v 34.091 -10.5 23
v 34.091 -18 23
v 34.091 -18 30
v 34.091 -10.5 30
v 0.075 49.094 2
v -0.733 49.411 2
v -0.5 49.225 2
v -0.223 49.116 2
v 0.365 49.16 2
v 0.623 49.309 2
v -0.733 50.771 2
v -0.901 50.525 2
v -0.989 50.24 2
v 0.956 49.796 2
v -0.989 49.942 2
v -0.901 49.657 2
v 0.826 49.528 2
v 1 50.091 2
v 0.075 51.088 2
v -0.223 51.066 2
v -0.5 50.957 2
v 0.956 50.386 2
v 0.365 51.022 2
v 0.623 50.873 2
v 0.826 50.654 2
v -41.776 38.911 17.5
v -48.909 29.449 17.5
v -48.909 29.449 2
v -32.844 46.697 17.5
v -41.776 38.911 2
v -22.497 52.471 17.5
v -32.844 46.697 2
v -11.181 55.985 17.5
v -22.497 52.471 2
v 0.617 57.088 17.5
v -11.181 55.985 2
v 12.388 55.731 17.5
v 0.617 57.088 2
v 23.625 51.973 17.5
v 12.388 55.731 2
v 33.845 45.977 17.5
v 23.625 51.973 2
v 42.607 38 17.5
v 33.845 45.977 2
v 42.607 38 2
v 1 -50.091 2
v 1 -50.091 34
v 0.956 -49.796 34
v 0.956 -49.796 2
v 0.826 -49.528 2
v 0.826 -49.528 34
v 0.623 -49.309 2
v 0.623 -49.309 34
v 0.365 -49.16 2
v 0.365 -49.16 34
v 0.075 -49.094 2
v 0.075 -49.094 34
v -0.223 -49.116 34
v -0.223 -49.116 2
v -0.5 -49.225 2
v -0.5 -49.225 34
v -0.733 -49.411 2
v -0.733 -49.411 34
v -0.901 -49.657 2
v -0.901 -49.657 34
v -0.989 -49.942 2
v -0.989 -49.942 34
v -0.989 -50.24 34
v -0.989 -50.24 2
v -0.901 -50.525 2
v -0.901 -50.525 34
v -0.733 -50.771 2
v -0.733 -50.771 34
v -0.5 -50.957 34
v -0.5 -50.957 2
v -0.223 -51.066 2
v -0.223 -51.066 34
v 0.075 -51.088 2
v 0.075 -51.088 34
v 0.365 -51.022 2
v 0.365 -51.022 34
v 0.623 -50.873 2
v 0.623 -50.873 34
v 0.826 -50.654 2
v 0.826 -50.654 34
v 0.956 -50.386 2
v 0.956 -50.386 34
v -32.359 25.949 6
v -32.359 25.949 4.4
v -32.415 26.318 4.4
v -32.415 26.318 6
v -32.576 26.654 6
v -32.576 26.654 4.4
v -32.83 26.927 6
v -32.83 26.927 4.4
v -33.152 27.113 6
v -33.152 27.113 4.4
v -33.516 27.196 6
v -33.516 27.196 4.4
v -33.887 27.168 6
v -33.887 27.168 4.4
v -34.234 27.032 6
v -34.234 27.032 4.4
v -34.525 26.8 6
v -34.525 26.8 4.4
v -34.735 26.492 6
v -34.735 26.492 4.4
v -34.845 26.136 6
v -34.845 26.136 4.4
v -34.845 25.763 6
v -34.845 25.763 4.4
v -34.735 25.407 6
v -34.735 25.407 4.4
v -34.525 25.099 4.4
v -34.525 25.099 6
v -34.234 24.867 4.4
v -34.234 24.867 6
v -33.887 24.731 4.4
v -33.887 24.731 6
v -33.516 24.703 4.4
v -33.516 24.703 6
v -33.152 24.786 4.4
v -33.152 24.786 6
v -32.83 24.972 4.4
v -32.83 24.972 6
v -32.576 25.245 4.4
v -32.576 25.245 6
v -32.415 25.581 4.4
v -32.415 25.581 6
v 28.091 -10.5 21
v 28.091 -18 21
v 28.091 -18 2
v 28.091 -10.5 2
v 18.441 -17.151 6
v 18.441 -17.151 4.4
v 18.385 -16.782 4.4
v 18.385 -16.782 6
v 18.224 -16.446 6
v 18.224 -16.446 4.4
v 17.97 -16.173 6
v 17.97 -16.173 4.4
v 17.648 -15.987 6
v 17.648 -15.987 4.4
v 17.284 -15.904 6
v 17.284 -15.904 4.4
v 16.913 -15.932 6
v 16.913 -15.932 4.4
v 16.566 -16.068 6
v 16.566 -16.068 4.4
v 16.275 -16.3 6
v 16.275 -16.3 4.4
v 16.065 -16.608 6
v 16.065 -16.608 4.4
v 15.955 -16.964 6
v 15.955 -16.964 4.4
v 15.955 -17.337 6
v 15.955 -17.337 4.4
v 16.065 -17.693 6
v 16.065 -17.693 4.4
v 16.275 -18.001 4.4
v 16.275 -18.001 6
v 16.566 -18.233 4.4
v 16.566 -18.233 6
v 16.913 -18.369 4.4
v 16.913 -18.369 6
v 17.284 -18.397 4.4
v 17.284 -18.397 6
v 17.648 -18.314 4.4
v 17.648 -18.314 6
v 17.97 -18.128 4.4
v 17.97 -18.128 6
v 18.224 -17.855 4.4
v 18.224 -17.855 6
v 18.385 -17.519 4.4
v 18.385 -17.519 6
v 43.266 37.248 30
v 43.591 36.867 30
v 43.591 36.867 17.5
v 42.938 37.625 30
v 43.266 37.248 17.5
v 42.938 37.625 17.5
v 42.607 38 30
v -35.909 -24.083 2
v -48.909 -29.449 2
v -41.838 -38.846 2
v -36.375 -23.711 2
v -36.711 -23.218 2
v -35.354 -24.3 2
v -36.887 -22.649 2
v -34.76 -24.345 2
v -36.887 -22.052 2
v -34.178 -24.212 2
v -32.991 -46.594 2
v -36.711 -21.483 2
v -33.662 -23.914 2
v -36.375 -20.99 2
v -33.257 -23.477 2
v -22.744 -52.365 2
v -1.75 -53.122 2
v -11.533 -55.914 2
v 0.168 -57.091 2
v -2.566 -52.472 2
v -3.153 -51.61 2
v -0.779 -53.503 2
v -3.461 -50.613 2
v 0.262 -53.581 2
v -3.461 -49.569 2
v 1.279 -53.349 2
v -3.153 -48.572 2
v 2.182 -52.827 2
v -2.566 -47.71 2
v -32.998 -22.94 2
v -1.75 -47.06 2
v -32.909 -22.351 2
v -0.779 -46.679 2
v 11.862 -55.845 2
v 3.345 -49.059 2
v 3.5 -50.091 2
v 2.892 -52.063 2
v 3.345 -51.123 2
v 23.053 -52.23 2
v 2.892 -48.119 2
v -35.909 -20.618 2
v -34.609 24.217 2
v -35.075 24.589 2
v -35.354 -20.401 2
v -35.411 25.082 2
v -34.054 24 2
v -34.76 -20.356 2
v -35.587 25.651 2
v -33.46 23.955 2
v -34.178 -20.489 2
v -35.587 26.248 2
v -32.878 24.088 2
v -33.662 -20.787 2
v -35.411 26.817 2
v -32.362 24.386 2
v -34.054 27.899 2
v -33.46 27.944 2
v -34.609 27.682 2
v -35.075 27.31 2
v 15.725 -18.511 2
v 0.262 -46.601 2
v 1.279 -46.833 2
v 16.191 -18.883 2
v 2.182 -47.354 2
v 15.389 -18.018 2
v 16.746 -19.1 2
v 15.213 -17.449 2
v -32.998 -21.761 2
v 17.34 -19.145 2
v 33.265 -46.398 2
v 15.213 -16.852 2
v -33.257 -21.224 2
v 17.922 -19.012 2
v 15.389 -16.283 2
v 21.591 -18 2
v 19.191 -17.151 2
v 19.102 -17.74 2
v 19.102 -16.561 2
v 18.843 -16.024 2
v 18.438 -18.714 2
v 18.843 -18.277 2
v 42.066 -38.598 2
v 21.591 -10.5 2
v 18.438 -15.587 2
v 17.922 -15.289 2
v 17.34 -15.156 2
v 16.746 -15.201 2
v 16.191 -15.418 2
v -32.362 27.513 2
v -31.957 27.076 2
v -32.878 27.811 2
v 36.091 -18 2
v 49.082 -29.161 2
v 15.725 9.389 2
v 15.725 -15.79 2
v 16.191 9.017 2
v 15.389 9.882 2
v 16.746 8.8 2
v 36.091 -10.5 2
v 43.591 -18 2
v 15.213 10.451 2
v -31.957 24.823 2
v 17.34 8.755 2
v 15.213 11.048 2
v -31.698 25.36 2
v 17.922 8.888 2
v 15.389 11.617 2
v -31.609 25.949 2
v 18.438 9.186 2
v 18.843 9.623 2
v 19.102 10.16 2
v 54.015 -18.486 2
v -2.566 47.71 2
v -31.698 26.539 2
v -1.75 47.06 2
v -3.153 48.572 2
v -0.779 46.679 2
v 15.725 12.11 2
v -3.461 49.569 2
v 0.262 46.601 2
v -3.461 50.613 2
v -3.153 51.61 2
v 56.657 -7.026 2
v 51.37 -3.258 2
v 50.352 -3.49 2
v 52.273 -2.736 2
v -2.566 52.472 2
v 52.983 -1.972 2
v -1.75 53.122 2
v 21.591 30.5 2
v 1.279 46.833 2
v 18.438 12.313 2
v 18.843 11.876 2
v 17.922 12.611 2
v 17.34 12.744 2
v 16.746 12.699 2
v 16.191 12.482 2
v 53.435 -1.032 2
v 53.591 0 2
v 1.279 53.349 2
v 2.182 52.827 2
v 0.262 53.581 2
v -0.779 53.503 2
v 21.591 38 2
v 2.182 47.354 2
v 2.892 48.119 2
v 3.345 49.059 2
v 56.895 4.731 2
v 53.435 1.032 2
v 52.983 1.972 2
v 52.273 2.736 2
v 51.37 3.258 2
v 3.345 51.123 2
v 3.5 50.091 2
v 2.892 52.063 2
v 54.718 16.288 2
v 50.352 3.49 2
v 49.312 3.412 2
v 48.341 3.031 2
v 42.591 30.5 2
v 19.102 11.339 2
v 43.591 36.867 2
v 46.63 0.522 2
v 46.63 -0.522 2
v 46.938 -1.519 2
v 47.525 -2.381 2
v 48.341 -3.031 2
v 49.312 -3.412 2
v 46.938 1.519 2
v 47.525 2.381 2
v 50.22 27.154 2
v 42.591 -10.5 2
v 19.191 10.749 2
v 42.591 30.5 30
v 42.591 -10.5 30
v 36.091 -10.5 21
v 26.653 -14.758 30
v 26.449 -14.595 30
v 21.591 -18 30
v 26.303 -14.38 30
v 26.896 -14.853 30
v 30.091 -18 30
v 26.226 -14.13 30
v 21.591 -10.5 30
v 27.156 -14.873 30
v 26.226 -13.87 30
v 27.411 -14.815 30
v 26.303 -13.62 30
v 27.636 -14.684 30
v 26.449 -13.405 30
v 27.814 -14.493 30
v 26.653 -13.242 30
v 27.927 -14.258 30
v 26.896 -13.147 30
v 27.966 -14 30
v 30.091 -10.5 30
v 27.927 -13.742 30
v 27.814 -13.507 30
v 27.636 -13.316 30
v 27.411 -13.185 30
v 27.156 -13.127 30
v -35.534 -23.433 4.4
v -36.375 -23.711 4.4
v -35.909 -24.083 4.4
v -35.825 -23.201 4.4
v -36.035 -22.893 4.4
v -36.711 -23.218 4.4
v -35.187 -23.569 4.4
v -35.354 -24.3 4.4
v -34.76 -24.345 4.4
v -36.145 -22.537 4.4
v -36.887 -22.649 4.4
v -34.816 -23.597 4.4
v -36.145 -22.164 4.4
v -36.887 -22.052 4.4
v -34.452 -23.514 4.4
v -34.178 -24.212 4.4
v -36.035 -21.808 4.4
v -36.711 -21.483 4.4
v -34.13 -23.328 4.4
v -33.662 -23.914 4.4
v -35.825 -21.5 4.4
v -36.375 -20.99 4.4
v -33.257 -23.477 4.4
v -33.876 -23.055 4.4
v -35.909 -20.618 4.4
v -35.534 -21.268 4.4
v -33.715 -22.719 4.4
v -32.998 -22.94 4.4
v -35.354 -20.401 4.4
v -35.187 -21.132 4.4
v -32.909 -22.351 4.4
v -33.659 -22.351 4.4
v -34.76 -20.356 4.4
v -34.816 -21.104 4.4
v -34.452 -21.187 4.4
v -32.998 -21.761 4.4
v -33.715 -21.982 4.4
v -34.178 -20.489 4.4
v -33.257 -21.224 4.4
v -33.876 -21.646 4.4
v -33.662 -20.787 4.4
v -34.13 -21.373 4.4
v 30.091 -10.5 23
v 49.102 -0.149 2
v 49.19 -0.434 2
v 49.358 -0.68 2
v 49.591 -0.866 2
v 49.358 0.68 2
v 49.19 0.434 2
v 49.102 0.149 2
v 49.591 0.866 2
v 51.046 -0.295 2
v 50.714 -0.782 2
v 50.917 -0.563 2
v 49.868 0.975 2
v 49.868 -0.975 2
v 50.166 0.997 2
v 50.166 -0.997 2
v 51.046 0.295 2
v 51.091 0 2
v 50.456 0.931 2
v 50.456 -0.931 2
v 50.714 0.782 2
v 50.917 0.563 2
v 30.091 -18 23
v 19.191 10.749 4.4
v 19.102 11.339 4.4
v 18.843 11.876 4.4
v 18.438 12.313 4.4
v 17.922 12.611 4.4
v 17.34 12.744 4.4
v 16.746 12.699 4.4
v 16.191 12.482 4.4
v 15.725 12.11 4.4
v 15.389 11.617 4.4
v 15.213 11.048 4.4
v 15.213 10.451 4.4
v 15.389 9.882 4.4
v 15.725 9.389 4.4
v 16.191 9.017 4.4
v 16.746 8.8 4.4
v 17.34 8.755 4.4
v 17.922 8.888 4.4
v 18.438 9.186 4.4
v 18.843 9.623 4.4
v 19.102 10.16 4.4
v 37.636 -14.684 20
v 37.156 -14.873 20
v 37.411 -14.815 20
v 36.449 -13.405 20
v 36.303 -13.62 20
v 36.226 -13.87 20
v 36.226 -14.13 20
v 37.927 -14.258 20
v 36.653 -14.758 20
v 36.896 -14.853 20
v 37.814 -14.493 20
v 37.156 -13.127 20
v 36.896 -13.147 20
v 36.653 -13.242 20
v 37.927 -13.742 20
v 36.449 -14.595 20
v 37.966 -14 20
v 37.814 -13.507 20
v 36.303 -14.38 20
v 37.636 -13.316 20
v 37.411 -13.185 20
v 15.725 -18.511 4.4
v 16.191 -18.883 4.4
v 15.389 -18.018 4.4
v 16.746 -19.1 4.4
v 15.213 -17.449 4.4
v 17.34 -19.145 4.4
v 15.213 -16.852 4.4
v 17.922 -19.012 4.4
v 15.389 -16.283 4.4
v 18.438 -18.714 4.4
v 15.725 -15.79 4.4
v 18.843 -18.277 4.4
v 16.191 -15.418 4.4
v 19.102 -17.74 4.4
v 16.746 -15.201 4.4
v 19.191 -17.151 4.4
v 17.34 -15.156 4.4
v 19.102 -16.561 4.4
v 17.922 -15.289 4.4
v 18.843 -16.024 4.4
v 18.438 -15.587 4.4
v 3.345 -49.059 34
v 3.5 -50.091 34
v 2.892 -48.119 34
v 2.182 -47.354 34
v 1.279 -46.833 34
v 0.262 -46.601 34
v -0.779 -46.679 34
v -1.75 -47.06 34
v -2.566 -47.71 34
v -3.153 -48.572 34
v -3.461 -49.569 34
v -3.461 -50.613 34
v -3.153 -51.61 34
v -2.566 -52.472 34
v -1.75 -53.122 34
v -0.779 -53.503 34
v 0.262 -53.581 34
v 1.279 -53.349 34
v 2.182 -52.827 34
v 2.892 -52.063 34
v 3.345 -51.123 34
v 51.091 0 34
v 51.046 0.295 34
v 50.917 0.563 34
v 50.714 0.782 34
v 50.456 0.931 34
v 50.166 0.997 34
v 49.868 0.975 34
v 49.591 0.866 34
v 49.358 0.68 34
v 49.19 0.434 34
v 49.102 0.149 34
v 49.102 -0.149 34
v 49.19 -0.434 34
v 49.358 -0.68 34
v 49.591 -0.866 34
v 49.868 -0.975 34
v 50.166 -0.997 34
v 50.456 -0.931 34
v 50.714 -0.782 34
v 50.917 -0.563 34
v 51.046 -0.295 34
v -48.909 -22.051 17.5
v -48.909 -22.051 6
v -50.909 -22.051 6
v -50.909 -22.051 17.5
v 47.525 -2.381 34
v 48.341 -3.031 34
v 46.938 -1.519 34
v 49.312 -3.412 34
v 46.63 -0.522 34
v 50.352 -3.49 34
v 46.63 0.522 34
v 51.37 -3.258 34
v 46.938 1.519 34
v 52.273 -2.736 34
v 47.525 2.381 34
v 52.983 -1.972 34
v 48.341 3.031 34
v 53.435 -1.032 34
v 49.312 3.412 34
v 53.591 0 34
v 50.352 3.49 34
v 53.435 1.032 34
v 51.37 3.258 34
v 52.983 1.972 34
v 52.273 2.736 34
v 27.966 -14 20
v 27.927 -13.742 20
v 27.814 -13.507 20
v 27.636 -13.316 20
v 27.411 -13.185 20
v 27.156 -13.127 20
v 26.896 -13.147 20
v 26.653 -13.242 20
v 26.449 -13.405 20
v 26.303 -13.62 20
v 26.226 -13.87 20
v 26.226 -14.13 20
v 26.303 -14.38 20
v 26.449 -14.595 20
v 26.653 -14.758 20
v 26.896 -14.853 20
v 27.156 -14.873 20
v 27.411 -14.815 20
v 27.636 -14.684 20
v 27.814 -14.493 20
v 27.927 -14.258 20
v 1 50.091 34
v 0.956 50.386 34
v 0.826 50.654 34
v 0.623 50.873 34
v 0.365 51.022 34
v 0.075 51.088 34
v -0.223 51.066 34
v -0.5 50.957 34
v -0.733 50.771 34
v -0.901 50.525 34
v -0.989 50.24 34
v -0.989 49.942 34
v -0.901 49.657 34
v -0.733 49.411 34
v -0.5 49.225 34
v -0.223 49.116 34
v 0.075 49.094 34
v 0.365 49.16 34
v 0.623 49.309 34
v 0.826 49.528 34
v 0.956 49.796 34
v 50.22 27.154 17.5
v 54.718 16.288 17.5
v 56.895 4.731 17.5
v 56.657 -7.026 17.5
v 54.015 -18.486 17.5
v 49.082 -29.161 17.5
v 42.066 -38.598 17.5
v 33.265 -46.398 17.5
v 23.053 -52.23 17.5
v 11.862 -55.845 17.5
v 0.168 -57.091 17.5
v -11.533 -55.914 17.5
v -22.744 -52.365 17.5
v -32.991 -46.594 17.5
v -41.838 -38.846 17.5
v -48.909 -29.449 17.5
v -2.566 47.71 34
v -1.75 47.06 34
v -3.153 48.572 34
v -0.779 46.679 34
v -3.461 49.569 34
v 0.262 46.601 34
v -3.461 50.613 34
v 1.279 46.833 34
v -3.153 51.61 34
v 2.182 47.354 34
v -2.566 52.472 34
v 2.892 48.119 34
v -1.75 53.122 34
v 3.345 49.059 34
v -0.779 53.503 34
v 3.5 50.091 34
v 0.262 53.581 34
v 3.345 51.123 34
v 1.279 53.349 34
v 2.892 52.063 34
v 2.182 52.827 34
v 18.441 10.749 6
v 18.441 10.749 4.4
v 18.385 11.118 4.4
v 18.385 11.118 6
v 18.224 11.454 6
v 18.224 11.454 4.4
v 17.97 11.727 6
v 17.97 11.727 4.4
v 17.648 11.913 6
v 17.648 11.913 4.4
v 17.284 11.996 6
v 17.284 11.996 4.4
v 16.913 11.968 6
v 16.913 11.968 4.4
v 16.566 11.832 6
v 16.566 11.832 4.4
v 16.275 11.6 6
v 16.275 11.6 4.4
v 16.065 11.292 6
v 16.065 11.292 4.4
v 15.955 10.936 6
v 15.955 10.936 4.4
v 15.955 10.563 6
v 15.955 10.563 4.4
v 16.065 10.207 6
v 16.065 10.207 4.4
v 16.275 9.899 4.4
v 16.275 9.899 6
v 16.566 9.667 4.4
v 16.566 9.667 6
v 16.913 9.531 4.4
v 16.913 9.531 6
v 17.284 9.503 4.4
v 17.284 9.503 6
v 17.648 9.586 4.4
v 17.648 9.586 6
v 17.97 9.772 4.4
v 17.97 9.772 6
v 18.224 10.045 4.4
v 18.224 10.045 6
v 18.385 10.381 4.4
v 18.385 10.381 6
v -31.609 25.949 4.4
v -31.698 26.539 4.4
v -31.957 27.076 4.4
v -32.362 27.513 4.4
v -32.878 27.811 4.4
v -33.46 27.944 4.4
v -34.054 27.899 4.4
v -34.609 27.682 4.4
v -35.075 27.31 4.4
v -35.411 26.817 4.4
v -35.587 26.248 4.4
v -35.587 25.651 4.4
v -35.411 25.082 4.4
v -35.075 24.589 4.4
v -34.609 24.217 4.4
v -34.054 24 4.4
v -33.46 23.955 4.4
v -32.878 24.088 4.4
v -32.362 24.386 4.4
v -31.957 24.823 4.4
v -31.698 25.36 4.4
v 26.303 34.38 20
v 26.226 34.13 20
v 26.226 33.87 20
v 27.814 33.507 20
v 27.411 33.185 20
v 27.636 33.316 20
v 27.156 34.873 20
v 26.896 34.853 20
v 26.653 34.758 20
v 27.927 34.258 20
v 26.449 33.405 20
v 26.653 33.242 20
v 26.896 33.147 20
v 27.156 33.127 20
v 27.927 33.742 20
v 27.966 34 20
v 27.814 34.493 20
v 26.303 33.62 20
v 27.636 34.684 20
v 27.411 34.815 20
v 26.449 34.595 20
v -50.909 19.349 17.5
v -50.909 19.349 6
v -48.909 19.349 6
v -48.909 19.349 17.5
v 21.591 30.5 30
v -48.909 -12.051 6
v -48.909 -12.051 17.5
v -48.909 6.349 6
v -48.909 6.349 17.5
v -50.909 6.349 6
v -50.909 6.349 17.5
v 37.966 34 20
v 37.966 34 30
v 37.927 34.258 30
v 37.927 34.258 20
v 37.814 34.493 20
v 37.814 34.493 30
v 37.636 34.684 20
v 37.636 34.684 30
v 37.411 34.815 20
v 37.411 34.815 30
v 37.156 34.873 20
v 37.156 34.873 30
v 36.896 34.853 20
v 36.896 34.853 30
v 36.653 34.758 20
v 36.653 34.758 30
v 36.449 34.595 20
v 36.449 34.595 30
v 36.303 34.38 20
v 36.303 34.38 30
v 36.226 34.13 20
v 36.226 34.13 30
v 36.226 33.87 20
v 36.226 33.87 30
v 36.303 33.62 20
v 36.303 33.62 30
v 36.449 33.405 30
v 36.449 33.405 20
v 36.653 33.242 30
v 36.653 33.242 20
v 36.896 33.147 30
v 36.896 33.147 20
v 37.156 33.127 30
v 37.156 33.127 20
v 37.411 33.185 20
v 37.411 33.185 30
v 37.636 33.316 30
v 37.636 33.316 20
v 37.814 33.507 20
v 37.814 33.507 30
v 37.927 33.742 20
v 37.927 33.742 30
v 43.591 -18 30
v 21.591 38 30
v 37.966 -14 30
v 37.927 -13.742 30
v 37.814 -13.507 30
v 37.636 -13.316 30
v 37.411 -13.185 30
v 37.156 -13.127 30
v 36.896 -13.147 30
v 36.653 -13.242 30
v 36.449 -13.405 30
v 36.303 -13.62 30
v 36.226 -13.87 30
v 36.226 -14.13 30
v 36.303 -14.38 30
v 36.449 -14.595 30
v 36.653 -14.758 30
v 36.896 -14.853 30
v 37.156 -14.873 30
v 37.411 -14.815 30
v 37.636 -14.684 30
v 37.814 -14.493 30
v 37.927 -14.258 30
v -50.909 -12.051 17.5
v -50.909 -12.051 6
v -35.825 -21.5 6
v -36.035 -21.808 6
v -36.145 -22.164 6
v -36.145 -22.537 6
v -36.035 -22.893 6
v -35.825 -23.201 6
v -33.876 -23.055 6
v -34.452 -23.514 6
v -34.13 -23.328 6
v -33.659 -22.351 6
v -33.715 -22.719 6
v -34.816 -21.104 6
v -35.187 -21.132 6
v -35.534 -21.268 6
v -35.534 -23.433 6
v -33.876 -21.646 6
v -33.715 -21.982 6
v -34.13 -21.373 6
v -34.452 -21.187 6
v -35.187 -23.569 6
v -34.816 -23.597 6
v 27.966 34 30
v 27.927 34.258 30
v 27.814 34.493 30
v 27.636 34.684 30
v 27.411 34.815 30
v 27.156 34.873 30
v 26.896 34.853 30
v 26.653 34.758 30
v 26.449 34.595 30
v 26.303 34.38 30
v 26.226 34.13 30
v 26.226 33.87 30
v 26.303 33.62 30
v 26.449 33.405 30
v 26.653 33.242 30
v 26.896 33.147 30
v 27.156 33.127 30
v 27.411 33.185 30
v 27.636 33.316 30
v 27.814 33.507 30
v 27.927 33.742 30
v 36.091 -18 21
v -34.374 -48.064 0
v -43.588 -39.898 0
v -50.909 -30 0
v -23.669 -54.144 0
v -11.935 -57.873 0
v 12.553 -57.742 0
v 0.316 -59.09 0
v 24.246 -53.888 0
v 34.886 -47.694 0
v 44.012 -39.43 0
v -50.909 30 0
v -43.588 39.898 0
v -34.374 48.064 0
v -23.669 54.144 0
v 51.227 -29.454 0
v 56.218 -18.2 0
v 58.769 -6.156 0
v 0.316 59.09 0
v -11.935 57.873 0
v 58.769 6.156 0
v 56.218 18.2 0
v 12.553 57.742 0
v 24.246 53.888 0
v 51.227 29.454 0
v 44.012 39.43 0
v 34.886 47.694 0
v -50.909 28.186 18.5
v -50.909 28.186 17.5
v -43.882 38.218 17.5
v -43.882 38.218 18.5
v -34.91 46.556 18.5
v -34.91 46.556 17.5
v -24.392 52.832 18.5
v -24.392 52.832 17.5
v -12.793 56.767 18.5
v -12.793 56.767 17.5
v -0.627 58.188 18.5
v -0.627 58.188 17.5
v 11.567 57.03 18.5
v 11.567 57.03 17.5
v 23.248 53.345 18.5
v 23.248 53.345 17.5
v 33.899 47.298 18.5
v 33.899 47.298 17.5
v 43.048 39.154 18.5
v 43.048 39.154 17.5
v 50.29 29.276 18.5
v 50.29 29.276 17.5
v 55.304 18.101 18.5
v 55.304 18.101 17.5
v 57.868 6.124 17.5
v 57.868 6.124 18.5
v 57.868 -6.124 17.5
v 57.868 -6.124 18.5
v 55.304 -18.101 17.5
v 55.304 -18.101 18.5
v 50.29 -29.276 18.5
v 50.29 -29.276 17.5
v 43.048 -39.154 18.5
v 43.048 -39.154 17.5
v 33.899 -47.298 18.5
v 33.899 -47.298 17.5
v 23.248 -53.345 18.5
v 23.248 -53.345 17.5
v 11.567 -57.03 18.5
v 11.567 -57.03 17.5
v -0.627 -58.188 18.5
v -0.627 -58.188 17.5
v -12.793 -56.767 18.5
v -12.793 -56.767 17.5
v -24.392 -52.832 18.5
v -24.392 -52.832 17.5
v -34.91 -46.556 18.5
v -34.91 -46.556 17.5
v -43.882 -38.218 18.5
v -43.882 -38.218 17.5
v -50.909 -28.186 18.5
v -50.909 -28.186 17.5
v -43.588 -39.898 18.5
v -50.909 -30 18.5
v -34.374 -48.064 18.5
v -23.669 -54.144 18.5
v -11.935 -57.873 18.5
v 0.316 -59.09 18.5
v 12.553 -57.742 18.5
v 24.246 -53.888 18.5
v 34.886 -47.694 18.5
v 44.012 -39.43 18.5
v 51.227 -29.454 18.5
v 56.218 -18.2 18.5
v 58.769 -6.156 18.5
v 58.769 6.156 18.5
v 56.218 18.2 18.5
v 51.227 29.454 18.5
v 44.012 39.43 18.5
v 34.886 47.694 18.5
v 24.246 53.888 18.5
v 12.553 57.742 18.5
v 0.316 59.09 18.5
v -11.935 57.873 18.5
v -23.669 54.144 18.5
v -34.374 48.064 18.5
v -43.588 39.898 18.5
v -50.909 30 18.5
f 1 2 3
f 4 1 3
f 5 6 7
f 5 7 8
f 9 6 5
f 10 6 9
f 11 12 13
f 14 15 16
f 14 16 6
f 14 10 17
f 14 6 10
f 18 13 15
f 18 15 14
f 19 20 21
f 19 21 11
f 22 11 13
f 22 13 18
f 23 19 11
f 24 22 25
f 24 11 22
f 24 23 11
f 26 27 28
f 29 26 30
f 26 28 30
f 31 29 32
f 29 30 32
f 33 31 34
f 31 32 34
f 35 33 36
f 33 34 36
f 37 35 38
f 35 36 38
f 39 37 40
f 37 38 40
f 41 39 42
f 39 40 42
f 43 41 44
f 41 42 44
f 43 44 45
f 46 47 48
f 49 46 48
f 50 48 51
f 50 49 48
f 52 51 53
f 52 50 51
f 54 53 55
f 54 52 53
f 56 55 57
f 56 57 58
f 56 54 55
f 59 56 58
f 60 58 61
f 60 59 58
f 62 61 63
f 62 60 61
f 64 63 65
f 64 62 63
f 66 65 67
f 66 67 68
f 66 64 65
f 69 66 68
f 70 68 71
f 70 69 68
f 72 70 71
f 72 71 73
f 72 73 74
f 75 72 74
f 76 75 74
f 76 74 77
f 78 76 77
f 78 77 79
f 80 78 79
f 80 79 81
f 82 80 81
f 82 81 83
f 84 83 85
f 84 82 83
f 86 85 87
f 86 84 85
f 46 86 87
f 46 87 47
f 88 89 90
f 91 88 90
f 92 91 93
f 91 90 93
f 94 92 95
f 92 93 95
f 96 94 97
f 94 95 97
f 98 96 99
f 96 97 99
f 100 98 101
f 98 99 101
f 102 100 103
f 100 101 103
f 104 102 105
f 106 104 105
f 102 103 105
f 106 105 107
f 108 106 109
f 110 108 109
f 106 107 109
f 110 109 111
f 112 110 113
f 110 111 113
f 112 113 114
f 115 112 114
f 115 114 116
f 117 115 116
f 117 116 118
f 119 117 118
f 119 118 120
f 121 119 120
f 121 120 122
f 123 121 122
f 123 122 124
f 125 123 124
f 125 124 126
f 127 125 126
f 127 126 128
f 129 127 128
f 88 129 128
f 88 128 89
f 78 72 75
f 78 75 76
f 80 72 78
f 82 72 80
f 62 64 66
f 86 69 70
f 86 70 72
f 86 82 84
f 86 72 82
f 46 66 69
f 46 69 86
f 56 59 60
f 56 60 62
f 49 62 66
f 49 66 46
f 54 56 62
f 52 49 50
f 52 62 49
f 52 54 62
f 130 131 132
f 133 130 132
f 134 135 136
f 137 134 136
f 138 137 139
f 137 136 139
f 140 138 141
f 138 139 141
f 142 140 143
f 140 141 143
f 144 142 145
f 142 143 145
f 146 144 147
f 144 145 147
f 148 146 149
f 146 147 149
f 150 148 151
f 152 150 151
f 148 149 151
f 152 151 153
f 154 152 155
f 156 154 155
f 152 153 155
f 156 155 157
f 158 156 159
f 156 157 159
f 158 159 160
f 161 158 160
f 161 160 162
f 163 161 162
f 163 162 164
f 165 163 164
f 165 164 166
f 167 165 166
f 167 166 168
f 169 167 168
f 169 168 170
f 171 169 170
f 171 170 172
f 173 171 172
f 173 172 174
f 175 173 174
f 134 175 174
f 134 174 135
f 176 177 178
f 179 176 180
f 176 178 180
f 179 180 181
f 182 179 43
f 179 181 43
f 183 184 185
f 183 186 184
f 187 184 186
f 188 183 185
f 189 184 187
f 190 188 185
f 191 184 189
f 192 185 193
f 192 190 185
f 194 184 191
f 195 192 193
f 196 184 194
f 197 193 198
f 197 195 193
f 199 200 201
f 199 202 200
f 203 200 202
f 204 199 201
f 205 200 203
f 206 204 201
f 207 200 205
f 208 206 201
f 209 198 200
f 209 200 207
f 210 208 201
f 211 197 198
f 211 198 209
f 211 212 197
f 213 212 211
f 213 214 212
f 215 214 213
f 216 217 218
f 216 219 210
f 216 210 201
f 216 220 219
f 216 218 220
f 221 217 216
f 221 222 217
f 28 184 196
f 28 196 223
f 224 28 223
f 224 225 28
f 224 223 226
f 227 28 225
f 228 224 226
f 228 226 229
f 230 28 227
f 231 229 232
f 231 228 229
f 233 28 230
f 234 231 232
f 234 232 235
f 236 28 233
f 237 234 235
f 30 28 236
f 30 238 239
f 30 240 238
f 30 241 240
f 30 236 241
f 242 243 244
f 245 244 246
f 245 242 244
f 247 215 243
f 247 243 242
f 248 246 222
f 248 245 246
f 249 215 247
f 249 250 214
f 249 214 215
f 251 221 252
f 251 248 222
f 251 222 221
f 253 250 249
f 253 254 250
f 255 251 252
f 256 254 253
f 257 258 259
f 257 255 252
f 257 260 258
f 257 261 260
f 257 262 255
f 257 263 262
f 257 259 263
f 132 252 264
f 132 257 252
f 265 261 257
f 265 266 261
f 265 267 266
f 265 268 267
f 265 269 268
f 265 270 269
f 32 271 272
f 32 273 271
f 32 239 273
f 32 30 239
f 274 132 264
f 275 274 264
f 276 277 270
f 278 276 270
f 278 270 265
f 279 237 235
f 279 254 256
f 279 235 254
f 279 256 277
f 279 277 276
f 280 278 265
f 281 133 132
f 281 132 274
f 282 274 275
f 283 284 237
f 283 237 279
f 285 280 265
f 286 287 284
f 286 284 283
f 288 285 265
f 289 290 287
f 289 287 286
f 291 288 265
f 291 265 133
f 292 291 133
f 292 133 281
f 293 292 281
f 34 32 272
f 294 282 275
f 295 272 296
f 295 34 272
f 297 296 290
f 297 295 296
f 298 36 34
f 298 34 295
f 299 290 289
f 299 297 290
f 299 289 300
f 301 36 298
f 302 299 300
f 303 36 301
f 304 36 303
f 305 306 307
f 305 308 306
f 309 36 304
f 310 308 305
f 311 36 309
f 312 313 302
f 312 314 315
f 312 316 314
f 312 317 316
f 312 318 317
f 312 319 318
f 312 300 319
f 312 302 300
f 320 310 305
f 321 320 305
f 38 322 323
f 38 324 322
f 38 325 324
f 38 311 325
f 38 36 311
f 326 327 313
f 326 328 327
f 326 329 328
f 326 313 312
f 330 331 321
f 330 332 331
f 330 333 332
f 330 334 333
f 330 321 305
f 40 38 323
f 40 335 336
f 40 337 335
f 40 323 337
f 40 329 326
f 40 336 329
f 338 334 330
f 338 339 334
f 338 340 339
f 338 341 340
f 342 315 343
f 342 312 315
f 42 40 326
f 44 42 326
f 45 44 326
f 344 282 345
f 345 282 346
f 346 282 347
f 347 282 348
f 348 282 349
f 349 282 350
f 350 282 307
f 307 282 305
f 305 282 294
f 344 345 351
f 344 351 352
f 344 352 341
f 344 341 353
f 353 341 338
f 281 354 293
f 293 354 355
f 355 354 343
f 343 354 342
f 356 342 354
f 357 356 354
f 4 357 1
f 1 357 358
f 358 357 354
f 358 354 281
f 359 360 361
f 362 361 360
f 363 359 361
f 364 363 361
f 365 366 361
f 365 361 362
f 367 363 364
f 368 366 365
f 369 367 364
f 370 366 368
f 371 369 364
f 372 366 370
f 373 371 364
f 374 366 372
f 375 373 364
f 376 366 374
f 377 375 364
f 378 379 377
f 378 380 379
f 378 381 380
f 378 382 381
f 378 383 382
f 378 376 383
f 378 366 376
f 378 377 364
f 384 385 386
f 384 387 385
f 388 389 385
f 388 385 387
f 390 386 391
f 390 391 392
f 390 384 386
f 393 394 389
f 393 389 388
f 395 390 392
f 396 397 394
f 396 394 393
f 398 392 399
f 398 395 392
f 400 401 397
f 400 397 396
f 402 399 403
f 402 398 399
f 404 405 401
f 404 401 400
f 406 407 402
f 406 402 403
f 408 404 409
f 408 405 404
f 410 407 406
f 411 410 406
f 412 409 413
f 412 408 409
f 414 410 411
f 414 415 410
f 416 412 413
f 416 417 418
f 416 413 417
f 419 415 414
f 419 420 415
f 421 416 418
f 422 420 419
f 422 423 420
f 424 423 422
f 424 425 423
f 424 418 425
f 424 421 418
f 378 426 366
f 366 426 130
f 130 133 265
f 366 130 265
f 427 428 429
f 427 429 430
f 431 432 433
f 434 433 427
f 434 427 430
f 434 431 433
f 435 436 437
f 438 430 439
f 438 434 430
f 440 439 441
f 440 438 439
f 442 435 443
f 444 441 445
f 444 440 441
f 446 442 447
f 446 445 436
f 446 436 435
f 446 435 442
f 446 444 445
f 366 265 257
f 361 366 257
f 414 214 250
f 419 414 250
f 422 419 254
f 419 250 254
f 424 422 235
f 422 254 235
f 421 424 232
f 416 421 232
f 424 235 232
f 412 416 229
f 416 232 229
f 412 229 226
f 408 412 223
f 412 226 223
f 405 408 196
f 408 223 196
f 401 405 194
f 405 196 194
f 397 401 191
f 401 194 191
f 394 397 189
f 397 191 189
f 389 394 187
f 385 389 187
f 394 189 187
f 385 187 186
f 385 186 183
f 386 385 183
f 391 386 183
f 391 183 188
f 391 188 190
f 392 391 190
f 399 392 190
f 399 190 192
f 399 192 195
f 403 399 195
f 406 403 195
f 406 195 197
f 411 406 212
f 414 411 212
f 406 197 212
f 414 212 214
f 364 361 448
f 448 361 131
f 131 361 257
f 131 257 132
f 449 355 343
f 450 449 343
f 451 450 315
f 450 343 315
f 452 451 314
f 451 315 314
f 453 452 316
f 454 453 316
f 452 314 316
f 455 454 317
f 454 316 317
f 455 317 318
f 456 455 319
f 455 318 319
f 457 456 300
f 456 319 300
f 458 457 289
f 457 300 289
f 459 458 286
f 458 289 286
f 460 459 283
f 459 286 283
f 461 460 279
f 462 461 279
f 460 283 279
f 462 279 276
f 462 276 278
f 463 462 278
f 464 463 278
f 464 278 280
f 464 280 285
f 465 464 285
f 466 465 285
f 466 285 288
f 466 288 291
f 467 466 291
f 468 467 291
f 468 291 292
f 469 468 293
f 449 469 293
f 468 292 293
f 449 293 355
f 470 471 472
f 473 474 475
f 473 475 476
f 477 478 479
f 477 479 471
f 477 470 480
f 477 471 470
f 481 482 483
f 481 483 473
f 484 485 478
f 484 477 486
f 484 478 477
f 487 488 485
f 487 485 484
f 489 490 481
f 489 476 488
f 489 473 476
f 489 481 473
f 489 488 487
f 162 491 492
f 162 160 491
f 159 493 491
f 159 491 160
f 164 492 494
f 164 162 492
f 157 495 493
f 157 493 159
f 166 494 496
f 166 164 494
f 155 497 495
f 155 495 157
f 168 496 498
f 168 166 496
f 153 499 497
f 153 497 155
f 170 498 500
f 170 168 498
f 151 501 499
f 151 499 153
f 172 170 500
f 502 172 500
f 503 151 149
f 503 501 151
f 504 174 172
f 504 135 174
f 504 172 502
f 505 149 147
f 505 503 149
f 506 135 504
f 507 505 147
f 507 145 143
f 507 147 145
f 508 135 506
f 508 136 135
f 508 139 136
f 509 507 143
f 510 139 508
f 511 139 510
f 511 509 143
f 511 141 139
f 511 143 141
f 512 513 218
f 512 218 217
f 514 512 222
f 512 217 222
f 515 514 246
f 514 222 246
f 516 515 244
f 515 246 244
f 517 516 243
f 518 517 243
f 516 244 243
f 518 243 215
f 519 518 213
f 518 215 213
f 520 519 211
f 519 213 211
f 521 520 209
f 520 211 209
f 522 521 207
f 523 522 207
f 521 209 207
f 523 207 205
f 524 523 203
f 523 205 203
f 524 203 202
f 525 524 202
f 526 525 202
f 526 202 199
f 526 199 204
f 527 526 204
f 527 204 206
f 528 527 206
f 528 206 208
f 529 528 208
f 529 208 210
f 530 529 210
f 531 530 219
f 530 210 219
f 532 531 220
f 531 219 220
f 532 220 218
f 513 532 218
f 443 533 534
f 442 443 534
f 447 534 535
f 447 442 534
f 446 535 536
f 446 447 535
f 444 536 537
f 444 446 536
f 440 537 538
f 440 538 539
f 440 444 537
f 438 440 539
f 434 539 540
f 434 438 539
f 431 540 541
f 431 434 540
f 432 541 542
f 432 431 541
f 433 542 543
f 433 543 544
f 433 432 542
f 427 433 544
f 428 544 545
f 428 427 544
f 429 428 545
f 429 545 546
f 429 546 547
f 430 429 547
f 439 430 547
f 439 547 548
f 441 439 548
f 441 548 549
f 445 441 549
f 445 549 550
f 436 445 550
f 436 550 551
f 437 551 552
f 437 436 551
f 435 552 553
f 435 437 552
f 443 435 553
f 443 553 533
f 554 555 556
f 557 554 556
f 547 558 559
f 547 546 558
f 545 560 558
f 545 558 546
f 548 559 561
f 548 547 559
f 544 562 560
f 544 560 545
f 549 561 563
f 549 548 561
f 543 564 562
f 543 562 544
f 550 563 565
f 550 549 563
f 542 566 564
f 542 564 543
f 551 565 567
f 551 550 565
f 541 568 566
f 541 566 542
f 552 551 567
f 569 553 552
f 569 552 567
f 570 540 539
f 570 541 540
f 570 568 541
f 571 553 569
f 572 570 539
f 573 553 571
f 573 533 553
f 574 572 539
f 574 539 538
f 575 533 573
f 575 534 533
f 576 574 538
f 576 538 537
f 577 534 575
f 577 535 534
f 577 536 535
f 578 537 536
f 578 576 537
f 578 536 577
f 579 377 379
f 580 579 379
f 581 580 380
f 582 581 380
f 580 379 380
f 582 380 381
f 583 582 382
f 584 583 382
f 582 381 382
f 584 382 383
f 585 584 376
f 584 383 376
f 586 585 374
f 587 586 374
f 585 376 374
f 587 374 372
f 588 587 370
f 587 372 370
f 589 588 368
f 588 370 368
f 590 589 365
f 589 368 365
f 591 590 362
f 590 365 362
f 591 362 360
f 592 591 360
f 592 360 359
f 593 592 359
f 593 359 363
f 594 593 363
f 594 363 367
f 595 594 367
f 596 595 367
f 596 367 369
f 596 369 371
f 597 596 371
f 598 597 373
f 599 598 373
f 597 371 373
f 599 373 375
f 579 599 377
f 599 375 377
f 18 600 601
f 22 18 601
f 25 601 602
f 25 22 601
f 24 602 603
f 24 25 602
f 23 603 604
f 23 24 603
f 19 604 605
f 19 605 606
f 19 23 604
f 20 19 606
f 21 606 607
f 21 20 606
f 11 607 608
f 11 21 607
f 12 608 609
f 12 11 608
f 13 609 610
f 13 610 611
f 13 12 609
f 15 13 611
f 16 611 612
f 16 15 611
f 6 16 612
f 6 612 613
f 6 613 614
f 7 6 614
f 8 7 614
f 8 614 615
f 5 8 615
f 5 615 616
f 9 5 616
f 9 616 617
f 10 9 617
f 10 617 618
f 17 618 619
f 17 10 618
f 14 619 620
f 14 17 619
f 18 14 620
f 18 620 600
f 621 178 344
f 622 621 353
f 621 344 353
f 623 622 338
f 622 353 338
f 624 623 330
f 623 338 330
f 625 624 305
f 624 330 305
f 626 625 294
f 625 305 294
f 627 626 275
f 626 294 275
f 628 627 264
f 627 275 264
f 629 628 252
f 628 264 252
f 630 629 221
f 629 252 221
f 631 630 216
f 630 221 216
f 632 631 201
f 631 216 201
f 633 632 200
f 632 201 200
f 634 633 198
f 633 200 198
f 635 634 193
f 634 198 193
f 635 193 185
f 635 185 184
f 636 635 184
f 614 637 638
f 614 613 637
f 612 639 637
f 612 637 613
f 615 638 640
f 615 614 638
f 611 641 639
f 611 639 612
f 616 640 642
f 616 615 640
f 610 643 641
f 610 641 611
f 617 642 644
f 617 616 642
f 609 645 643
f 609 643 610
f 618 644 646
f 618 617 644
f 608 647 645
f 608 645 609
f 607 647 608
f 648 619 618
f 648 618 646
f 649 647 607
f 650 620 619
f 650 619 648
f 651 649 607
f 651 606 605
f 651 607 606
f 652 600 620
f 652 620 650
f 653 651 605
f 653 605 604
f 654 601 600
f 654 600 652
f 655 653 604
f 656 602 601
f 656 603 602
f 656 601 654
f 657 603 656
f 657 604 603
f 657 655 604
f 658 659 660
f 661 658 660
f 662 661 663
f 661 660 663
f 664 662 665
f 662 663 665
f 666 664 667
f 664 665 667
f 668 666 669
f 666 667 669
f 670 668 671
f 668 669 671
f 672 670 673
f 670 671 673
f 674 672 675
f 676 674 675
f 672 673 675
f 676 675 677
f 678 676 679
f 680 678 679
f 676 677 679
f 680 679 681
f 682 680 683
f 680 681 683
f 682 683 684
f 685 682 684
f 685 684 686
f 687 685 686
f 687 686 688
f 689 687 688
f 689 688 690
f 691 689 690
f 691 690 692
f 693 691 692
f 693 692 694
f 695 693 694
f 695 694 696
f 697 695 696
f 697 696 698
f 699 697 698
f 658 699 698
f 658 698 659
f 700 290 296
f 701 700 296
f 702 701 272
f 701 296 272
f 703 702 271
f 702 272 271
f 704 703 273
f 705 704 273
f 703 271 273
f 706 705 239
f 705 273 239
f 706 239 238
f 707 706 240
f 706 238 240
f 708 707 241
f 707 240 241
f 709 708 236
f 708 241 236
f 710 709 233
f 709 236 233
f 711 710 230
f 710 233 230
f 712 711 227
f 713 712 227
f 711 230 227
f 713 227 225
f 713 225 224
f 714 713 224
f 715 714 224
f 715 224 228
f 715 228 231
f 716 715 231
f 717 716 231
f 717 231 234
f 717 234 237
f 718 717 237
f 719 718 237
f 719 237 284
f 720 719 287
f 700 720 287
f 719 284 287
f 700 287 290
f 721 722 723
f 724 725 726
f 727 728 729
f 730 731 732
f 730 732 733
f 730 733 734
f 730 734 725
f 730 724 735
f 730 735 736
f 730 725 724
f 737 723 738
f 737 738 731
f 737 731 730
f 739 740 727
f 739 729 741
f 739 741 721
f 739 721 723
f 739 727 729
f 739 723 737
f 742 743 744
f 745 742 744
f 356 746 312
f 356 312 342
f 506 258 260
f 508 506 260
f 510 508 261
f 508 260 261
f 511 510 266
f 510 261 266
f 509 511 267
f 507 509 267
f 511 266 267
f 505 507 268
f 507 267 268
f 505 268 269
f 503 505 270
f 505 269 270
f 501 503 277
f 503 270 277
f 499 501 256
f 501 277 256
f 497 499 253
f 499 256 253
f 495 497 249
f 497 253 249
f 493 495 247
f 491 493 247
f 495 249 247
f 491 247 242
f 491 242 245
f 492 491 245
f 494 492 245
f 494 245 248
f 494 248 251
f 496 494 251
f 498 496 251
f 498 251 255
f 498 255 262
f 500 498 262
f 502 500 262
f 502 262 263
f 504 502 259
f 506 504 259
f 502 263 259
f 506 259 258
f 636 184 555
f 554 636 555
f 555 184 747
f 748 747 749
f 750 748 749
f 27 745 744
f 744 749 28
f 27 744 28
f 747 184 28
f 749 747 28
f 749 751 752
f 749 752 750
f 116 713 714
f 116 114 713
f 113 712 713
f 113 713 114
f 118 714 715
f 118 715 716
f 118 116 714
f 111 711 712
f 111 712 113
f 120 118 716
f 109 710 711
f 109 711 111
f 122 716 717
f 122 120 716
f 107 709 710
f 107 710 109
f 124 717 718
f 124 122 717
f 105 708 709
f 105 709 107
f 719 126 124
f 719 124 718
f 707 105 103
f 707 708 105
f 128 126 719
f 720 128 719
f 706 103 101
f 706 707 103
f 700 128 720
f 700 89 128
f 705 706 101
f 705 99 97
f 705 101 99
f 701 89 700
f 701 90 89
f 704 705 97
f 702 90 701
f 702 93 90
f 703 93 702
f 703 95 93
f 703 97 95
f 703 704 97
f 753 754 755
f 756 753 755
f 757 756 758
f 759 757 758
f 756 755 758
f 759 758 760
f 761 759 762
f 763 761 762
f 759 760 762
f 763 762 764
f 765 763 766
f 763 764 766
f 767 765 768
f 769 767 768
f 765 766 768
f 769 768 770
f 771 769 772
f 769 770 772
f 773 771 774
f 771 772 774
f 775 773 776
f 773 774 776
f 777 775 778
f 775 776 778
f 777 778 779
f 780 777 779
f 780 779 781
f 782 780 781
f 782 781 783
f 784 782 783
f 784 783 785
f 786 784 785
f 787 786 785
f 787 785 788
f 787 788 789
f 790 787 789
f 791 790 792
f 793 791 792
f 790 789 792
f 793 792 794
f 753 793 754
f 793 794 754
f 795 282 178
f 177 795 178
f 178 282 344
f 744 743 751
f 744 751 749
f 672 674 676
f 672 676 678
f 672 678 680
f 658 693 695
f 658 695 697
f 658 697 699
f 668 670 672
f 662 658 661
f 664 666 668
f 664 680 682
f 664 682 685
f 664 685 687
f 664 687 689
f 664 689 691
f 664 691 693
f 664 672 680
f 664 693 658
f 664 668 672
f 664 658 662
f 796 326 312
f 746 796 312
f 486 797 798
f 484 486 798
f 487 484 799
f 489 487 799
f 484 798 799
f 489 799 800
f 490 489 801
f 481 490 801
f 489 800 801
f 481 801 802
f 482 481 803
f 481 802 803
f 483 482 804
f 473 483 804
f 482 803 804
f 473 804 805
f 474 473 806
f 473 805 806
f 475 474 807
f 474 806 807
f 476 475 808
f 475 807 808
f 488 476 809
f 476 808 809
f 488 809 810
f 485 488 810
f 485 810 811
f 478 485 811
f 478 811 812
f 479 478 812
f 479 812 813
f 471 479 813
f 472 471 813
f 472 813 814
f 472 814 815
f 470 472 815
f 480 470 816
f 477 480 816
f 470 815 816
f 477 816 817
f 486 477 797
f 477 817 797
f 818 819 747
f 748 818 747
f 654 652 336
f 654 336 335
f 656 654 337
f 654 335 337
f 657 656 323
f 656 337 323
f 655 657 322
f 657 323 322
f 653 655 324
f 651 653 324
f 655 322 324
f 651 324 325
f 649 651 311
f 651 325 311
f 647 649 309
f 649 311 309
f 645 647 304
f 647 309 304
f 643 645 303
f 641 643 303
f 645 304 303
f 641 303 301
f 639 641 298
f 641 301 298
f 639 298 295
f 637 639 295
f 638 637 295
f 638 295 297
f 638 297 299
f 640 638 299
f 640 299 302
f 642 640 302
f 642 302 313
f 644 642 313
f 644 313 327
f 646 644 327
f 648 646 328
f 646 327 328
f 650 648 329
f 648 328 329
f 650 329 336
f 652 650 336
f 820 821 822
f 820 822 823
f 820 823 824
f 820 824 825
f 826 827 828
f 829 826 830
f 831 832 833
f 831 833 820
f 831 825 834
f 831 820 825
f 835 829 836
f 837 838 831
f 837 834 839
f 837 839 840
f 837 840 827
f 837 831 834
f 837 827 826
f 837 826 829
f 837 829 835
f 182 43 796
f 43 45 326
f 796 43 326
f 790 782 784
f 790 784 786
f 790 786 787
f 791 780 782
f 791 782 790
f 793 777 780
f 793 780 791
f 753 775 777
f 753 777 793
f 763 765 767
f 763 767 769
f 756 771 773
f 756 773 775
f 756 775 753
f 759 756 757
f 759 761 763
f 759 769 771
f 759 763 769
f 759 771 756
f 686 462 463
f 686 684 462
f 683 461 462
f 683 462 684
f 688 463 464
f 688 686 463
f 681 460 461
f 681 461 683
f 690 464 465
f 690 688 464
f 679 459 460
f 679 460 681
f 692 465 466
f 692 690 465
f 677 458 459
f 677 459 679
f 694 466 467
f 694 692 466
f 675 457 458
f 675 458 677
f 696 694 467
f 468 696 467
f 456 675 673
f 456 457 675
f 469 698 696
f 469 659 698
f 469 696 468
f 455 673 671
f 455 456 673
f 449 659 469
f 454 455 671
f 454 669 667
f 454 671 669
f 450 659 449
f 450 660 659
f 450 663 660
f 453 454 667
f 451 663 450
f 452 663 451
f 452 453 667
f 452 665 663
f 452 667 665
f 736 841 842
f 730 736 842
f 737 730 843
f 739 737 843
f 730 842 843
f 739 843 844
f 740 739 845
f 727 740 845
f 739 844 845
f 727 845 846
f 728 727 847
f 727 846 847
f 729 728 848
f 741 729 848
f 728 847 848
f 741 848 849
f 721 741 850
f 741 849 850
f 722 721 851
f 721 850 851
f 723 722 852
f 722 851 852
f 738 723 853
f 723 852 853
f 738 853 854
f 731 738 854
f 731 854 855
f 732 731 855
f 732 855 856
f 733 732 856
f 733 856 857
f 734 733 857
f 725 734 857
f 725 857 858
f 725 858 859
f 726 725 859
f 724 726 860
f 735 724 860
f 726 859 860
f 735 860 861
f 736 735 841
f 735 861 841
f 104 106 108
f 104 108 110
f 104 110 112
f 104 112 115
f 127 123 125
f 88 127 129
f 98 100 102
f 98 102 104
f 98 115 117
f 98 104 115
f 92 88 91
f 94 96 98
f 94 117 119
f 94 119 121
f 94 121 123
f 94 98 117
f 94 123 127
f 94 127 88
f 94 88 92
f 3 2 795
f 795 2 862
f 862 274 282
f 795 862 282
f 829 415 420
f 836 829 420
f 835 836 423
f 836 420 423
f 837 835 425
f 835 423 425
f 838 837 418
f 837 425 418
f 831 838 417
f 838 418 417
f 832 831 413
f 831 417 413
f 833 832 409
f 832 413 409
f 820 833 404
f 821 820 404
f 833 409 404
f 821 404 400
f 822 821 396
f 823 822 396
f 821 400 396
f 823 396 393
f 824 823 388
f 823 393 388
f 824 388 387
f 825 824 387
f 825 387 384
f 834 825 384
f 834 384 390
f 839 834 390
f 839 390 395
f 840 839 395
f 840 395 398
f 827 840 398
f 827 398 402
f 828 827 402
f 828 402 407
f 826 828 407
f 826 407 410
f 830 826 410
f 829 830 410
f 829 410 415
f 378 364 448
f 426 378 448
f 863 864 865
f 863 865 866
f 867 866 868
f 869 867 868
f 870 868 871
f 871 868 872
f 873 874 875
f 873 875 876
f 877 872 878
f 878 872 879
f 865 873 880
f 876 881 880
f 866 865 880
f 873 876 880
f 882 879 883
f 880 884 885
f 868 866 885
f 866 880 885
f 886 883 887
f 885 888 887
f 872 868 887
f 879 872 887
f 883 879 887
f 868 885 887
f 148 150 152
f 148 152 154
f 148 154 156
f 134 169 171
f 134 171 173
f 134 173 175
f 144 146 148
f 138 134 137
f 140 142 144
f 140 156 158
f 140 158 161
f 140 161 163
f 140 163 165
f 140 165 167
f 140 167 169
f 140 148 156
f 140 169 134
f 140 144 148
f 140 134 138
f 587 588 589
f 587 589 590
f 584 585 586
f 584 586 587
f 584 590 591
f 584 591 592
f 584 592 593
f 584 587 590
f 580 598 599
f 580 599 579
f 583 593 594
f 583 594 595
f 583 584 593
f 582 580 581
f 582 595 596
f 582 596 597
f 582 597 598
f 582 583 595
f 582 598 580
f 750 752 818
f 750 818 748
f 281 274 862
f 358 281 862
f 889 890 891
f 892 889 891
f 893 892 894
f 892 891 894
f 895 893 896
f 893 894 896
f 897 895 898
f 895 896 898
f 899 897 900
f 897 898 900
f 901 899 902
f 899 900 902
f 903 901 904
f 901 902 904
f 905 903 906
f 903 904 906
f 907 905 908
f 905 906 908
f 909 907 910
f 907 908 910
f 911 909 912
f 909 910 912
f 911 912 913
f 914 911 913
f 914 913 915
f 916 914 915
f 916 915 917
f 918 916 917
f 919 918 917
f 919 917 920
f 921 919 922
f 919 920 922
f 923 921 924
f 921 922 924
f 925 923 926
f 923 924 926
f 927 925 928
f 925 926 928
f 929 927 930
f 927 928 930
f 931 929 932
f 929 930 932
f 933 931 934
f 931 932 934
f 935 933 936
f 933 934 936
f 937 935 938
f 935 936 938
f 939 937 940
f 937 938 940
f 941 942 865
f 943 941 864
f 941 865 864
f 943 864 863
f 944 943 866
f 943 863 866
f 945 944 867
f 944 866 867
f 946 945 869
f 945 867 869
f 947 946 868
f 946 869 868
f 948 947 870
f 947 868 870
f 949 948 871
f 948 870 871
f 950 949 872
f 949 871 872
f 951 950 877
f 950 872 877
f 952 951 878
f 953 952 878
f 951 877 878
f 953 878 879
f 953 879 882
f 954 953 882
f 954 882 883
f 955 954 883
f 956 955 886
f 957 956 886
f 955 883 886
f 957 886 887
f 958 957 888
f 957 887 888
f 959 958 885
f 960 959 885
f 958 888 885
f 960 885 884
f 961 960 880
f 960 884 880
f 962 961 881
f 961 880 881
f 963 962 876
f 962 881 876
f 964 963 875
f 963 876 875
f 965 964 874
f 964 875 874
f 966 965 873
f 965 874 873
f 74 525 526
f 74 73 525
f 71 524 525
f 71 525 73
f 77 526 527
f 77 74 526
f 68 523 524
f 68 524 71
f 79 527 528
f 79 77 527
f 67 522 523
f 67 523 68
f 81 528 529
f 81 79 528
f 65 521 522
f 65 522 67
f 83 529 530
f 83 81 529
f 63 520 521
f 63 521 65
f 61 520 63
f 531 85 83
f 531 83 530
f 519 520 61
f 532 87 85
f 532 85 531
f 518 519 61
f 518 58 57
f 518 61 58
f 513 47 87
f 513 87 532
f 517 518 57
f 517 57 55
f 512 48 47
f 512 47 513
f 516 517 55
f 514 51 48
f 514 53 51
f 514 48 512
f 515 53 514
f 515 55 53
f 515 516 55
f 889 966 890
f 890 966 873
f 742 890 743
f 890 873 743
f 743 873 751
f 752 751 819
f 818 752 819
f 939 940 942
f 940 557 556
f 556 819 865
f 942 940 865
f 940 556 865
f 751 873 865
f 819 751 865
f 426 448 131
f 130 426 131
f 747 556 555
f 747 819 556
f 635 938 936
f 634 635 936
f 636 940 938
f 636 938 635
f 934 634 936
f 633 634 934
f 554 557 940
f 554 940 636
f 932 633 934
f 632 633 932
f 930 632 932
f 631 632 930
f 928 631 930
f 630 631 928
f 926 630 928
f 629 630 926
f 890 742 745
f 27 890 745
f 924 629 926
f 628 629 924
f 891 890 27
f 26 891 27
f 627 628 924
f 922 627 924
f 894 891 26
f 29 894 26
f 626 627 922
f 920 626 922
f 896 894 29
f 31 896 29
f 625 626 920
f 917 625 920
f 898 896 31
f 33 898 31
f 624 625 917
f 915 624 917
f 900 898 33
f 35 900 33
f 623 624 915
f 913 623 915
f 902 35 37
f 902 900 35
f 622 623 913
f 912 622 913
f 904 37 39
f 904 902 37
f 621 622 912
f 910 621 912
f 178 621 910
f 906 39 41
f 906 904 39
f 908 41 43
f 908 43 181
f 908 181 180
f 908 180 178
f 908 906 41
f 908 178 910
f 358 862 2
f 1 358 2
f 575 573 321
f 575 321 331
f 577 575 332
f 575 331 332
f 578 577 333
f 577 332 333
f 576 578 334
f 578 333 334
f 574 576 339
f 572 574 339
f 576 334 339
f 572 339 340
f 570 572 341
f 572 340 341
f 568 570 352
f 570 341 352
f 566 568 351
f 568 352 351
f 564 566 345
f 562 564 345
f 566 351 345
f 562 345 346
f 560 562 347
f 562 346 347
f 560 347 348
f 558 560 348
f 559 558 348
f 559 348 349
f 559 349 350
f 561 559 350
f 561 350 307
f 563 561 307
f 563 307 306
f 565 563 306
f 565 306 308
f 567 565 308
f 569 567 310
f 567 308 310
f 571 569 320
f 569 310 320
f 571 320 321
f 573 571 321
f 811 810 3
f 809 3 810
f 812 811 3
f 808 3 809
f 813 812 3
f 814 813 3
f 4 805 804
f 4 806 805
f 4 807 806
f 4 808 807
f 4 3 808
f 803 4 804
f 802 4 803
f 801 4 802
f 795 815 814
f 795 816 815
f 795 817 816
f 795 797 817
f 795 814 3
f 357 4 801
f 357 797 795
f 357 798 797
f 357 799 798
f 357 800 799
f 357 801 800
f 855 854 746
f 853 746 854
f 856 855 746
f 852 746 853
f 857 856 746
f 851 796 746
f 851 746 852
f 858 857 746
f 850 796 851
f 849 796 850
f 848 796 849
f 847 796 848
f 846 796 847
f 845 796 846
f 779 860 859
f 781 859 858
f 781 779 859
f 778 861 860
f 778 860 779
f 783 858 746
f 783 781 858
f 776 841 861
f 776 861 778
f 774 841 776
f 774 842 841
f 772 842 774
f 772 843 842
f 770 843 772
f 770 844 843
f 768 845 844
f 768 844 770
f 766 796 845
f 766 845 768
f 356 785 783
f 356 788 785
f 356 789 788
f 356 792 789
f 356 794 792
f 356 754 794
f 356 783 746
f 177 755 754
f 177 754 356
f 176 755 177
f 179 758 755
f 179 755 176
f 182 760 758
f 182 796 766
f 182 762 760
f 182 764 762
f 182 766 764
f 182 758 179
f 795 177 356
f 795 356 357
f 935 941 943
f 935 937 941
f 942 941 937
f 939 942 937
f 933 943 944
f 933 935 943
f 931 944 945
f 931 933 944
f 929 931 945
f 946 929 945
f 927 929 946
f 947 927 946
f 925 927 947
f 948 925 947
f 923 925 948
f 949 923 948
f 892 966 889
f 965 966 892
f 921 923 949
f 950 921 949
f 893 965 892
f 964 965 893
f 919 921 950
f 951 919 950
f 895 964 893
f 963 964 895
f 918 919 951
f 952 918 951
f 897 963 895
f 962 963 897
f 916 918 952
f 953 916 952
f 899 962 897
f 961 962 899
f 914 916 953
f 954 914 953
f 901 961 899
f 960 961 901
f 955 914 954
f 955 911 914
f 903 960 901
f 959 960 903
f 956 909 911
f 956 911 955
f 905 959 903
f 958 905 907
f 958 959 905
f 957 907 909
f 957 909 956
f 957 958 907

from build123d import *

# Parameters (mm, degrees)
F1_DEPTH  = 2
F2_W      = 2
F2_H      = 18.4
F2_H_2    = 13
F2_H_3    = 10
F3_DEPTH  = 4
F2_R      = 1.25
F4_DEPTH  = 4
F2_R_2    = 2
F5_DEPTH  = 2.4
F6_DEPTH  = 15.5
F7_R      = 3.5
F7_R_2    = 1
F8_DEPTH  = 32
F10_DEPTH = 28
F11_R     = 0.875
F12_DEPTH = 10
F14_DEPTH = 25
F16_DEPTH = 1


with BuildPart() as f1:
    # F0 (on Top) → F1 (new body)
    with BuildSketch(Plane.XY):
        with BuildLine():
            Line((-50.909091, 30), (-50.909091, -30))
            ThreePointArc((-50.909091, -30), (59.090909, 0), (-50.909091, 30))
        make_face()
    extrude(amount=F1_DEPTH)

    # F2 (on face) → F3 (join)
    with BuildSketch(Plane.XY.offset(2)):
        with BuildLine():
            ThreePointArc((-48.909091, 29.449495), (57.090909, 0), (-48.909091, -29.449495))
            Line((-48.909091, -29.449495), (-48.909091, -22.050505))
            Line((-48.909091, -22.050505), (-50.909091, -22.050505))
            Line((-50.909091, -22.050505), (-50.909091, -30))
            ThreePointArc((-50.909091, -30), (59.090909, 0), (-50.909091, 30))
            Line((-50.909091, 30), (-50.909091, 19.349495))
            Line((-50.909091, 19.349495), (-48.909091, 19.349495))
            Line((-48.909091, 19.349495), (-48.909091, 29.449495))
        make_face()
        with Locations((-49.909091, -2.850505)):
            Rectangle(F2_W, F2_H)
        with Locations((-49.909091, 12.849495)):
            Rectangle(F2_W, F2_H_2)
        with Locations((-49.909091, -17.050505)):
            Rectangle(F2_W, F2_H_3)
    extrude(amount=F3_DEPTH)

    # F2 (on face) → F4 (join)
    with BuildSketch(Plane.XY.offset(2)):
        with Locations((-33.609091, 25.949495)):
            Circle(F2_R)
        with Locations((-34.909091, -22.350505)):
            Circle(F2_R)
        with Locations((17.190909, 10.749495)):
            Circle(F2_R)
        with Locations((17.190909, -17.150505)):
            Circle(F2_R)
    extrude(amount=F4_DEPTH)

    # F2 (on face) → F5 (join)
    with BuildSketch(Plane.XY.offset(2)):
        with Locations((-33.609091, 25.949495)):
            Circle(F2_R_2)
        with Locations((-33.609091, 25.949495)):
            Circle(F2_R, mode=Mode.SUBTRACT)
        with Locations((-34.909091, -22.350505)):
            Circle(F2_R_2)
        with Locations((-34.909091, -22.350505)):
            Circle(F2_R, mode=Mode.SUBTRACT)
        with Locations((17.190909, -17.150505)):
            Circle(F2_R_2)
        with Locations((17.190909, -17.150505)):
            Circle(F2_R, mode=Mode.SUBTRACT)
        with Locations((17.190909, 10.749495)):
            Circle(F2_R_2)
        with Locations((17.190909, 10.749495)):
            Circle(F2_R, mode=Mode.SUBTRACT)
    extrude(amount=F5_DEPTH)

    # F2 (on face) → F6 (join)
    with BuildSketch(Plane.XY.offset(2)):
        with BuildLine():
            ThreePointArc((-48.909091, 29.449495), (57.090909, 0), (-48.909091, -29.449495))
            Line((-48.909091, -29.449495), (-48.909091, -22.050505))
            Line((-48.909091, -22.050505), (-50.909091, -22.050505))
            Line((-50.909091, -22.050505), (-50.909091, -30))
            ThreePointArc((-50.909091, -30), (59.090909, 0), (-50.909091, 30))
            Line((-50.909091, 30), (-50.909091, 19.349495))
            Line((-50.909091, 19.349495), (-48.909091, 19.349495))
            Line((-48.909091, 19.349495), (-48.909091, 29.449495))
        make_face()
        with Locations((-49.909091, -2.850505)):
            Rectangle(F2_W, F2_H)
    extrude(amount=F6_DEPTH)

    # F7 (on face) → F8 (join)
    with BuildSketch(Plane.XY.offset(2)):
        with Locations((0, 50.090909)):
            Circle(F7_R)
        with Locations((0, 50.090909)):
            Circle(F7_R_2, mode=Mode.SUBTRACT)
        with Locations((50.090909, 0)):
            Circle(F7_R)
        with Locations((50.090909, 0)):
            Circle(F7_R_2, mode=Mode.SUBTRACT)
        with Locations((0, -50.090909)):
            Circle(F7_R)
        with Locations((0, -50.090909)):
            Circle(F7_R_2, mode=Mode.SUBTRACT)
    extrude(amount=F8_DEPTH)

    # F9 (on face) → F10 (join)
    with BuildSketch(Plane.XY.offset(2)):
        with BuildLine():
            Line((42.607181, 38), (21.590909, 38))
            Line((21.590909, 38), (21.590909, 30.5))
            Line((21.590909, 30.5), (42.590909, 30.5))
            Line((42.590909, 30.5), (42.590909, -10.5))
            Line((42.590909, -10.5), (21.590909, -10.5))
            Line((21.590909, -10.5), (21.590909, -18))
            Line((21.590909, -18), (43.590909, -18))
            Line((43.590909, -18), (43.590909, 36.867391))
            ThreePointArc((43.590909, 36.867391), (43.102766, 37.436927), (42.607181, 38))
        make_face()
    extrude(amount=F10_DEPTH)

    # F11 (on face) → F12 (cut)
    with BuildSketch(Plane.XY.offset(30)):
        with Locations((27.090909, 34)):
            Circle(F11_R)
        with Locations((37.090909, 34)):
            Circle(F11_R)
        with Locations((27.090909, -14)):
            Circle(F11_R)
        with Locations((37.090909, -14)):
            Circle(F11_R)
    extrude(amount=-F12_DEPTH, mode=Mode.SUBTRACT)

    # F13 (on face) → F14 (cut)
    with BuildSketch(Plane.XZ.offset(18)):
        Polygon((34.090909, 30), (30.090909, 30), (30.090909, 23), (28.090909, 21), (28.090909, 2), (36.090909, 2), (36.090909, 21), (34.090909, 23), align=None)
    extrude(amount=-F14_DEPTH, mode=Mode.SUBTRACT)

    # F15 (on face) → F16 (join)
    with BuildSketch(Plane.XY.offset(17.5)):
        with BuildLine():
            Line((-50.909091, -28.185925), (-50.909091, -30))
            ThreePointArc((-50.909091, -30), (59.090909, 0), (-50.909091, 30))
            Line((-50.909091, 30), (-50.909091, 28.185925))
            ThreePointArc((-50.909091, 28.185925), (58.190909, 0), (-50.909091, -28.185925))
        make_face()
    extrude(amount=F16_DEPTH)


solid = f1.part
